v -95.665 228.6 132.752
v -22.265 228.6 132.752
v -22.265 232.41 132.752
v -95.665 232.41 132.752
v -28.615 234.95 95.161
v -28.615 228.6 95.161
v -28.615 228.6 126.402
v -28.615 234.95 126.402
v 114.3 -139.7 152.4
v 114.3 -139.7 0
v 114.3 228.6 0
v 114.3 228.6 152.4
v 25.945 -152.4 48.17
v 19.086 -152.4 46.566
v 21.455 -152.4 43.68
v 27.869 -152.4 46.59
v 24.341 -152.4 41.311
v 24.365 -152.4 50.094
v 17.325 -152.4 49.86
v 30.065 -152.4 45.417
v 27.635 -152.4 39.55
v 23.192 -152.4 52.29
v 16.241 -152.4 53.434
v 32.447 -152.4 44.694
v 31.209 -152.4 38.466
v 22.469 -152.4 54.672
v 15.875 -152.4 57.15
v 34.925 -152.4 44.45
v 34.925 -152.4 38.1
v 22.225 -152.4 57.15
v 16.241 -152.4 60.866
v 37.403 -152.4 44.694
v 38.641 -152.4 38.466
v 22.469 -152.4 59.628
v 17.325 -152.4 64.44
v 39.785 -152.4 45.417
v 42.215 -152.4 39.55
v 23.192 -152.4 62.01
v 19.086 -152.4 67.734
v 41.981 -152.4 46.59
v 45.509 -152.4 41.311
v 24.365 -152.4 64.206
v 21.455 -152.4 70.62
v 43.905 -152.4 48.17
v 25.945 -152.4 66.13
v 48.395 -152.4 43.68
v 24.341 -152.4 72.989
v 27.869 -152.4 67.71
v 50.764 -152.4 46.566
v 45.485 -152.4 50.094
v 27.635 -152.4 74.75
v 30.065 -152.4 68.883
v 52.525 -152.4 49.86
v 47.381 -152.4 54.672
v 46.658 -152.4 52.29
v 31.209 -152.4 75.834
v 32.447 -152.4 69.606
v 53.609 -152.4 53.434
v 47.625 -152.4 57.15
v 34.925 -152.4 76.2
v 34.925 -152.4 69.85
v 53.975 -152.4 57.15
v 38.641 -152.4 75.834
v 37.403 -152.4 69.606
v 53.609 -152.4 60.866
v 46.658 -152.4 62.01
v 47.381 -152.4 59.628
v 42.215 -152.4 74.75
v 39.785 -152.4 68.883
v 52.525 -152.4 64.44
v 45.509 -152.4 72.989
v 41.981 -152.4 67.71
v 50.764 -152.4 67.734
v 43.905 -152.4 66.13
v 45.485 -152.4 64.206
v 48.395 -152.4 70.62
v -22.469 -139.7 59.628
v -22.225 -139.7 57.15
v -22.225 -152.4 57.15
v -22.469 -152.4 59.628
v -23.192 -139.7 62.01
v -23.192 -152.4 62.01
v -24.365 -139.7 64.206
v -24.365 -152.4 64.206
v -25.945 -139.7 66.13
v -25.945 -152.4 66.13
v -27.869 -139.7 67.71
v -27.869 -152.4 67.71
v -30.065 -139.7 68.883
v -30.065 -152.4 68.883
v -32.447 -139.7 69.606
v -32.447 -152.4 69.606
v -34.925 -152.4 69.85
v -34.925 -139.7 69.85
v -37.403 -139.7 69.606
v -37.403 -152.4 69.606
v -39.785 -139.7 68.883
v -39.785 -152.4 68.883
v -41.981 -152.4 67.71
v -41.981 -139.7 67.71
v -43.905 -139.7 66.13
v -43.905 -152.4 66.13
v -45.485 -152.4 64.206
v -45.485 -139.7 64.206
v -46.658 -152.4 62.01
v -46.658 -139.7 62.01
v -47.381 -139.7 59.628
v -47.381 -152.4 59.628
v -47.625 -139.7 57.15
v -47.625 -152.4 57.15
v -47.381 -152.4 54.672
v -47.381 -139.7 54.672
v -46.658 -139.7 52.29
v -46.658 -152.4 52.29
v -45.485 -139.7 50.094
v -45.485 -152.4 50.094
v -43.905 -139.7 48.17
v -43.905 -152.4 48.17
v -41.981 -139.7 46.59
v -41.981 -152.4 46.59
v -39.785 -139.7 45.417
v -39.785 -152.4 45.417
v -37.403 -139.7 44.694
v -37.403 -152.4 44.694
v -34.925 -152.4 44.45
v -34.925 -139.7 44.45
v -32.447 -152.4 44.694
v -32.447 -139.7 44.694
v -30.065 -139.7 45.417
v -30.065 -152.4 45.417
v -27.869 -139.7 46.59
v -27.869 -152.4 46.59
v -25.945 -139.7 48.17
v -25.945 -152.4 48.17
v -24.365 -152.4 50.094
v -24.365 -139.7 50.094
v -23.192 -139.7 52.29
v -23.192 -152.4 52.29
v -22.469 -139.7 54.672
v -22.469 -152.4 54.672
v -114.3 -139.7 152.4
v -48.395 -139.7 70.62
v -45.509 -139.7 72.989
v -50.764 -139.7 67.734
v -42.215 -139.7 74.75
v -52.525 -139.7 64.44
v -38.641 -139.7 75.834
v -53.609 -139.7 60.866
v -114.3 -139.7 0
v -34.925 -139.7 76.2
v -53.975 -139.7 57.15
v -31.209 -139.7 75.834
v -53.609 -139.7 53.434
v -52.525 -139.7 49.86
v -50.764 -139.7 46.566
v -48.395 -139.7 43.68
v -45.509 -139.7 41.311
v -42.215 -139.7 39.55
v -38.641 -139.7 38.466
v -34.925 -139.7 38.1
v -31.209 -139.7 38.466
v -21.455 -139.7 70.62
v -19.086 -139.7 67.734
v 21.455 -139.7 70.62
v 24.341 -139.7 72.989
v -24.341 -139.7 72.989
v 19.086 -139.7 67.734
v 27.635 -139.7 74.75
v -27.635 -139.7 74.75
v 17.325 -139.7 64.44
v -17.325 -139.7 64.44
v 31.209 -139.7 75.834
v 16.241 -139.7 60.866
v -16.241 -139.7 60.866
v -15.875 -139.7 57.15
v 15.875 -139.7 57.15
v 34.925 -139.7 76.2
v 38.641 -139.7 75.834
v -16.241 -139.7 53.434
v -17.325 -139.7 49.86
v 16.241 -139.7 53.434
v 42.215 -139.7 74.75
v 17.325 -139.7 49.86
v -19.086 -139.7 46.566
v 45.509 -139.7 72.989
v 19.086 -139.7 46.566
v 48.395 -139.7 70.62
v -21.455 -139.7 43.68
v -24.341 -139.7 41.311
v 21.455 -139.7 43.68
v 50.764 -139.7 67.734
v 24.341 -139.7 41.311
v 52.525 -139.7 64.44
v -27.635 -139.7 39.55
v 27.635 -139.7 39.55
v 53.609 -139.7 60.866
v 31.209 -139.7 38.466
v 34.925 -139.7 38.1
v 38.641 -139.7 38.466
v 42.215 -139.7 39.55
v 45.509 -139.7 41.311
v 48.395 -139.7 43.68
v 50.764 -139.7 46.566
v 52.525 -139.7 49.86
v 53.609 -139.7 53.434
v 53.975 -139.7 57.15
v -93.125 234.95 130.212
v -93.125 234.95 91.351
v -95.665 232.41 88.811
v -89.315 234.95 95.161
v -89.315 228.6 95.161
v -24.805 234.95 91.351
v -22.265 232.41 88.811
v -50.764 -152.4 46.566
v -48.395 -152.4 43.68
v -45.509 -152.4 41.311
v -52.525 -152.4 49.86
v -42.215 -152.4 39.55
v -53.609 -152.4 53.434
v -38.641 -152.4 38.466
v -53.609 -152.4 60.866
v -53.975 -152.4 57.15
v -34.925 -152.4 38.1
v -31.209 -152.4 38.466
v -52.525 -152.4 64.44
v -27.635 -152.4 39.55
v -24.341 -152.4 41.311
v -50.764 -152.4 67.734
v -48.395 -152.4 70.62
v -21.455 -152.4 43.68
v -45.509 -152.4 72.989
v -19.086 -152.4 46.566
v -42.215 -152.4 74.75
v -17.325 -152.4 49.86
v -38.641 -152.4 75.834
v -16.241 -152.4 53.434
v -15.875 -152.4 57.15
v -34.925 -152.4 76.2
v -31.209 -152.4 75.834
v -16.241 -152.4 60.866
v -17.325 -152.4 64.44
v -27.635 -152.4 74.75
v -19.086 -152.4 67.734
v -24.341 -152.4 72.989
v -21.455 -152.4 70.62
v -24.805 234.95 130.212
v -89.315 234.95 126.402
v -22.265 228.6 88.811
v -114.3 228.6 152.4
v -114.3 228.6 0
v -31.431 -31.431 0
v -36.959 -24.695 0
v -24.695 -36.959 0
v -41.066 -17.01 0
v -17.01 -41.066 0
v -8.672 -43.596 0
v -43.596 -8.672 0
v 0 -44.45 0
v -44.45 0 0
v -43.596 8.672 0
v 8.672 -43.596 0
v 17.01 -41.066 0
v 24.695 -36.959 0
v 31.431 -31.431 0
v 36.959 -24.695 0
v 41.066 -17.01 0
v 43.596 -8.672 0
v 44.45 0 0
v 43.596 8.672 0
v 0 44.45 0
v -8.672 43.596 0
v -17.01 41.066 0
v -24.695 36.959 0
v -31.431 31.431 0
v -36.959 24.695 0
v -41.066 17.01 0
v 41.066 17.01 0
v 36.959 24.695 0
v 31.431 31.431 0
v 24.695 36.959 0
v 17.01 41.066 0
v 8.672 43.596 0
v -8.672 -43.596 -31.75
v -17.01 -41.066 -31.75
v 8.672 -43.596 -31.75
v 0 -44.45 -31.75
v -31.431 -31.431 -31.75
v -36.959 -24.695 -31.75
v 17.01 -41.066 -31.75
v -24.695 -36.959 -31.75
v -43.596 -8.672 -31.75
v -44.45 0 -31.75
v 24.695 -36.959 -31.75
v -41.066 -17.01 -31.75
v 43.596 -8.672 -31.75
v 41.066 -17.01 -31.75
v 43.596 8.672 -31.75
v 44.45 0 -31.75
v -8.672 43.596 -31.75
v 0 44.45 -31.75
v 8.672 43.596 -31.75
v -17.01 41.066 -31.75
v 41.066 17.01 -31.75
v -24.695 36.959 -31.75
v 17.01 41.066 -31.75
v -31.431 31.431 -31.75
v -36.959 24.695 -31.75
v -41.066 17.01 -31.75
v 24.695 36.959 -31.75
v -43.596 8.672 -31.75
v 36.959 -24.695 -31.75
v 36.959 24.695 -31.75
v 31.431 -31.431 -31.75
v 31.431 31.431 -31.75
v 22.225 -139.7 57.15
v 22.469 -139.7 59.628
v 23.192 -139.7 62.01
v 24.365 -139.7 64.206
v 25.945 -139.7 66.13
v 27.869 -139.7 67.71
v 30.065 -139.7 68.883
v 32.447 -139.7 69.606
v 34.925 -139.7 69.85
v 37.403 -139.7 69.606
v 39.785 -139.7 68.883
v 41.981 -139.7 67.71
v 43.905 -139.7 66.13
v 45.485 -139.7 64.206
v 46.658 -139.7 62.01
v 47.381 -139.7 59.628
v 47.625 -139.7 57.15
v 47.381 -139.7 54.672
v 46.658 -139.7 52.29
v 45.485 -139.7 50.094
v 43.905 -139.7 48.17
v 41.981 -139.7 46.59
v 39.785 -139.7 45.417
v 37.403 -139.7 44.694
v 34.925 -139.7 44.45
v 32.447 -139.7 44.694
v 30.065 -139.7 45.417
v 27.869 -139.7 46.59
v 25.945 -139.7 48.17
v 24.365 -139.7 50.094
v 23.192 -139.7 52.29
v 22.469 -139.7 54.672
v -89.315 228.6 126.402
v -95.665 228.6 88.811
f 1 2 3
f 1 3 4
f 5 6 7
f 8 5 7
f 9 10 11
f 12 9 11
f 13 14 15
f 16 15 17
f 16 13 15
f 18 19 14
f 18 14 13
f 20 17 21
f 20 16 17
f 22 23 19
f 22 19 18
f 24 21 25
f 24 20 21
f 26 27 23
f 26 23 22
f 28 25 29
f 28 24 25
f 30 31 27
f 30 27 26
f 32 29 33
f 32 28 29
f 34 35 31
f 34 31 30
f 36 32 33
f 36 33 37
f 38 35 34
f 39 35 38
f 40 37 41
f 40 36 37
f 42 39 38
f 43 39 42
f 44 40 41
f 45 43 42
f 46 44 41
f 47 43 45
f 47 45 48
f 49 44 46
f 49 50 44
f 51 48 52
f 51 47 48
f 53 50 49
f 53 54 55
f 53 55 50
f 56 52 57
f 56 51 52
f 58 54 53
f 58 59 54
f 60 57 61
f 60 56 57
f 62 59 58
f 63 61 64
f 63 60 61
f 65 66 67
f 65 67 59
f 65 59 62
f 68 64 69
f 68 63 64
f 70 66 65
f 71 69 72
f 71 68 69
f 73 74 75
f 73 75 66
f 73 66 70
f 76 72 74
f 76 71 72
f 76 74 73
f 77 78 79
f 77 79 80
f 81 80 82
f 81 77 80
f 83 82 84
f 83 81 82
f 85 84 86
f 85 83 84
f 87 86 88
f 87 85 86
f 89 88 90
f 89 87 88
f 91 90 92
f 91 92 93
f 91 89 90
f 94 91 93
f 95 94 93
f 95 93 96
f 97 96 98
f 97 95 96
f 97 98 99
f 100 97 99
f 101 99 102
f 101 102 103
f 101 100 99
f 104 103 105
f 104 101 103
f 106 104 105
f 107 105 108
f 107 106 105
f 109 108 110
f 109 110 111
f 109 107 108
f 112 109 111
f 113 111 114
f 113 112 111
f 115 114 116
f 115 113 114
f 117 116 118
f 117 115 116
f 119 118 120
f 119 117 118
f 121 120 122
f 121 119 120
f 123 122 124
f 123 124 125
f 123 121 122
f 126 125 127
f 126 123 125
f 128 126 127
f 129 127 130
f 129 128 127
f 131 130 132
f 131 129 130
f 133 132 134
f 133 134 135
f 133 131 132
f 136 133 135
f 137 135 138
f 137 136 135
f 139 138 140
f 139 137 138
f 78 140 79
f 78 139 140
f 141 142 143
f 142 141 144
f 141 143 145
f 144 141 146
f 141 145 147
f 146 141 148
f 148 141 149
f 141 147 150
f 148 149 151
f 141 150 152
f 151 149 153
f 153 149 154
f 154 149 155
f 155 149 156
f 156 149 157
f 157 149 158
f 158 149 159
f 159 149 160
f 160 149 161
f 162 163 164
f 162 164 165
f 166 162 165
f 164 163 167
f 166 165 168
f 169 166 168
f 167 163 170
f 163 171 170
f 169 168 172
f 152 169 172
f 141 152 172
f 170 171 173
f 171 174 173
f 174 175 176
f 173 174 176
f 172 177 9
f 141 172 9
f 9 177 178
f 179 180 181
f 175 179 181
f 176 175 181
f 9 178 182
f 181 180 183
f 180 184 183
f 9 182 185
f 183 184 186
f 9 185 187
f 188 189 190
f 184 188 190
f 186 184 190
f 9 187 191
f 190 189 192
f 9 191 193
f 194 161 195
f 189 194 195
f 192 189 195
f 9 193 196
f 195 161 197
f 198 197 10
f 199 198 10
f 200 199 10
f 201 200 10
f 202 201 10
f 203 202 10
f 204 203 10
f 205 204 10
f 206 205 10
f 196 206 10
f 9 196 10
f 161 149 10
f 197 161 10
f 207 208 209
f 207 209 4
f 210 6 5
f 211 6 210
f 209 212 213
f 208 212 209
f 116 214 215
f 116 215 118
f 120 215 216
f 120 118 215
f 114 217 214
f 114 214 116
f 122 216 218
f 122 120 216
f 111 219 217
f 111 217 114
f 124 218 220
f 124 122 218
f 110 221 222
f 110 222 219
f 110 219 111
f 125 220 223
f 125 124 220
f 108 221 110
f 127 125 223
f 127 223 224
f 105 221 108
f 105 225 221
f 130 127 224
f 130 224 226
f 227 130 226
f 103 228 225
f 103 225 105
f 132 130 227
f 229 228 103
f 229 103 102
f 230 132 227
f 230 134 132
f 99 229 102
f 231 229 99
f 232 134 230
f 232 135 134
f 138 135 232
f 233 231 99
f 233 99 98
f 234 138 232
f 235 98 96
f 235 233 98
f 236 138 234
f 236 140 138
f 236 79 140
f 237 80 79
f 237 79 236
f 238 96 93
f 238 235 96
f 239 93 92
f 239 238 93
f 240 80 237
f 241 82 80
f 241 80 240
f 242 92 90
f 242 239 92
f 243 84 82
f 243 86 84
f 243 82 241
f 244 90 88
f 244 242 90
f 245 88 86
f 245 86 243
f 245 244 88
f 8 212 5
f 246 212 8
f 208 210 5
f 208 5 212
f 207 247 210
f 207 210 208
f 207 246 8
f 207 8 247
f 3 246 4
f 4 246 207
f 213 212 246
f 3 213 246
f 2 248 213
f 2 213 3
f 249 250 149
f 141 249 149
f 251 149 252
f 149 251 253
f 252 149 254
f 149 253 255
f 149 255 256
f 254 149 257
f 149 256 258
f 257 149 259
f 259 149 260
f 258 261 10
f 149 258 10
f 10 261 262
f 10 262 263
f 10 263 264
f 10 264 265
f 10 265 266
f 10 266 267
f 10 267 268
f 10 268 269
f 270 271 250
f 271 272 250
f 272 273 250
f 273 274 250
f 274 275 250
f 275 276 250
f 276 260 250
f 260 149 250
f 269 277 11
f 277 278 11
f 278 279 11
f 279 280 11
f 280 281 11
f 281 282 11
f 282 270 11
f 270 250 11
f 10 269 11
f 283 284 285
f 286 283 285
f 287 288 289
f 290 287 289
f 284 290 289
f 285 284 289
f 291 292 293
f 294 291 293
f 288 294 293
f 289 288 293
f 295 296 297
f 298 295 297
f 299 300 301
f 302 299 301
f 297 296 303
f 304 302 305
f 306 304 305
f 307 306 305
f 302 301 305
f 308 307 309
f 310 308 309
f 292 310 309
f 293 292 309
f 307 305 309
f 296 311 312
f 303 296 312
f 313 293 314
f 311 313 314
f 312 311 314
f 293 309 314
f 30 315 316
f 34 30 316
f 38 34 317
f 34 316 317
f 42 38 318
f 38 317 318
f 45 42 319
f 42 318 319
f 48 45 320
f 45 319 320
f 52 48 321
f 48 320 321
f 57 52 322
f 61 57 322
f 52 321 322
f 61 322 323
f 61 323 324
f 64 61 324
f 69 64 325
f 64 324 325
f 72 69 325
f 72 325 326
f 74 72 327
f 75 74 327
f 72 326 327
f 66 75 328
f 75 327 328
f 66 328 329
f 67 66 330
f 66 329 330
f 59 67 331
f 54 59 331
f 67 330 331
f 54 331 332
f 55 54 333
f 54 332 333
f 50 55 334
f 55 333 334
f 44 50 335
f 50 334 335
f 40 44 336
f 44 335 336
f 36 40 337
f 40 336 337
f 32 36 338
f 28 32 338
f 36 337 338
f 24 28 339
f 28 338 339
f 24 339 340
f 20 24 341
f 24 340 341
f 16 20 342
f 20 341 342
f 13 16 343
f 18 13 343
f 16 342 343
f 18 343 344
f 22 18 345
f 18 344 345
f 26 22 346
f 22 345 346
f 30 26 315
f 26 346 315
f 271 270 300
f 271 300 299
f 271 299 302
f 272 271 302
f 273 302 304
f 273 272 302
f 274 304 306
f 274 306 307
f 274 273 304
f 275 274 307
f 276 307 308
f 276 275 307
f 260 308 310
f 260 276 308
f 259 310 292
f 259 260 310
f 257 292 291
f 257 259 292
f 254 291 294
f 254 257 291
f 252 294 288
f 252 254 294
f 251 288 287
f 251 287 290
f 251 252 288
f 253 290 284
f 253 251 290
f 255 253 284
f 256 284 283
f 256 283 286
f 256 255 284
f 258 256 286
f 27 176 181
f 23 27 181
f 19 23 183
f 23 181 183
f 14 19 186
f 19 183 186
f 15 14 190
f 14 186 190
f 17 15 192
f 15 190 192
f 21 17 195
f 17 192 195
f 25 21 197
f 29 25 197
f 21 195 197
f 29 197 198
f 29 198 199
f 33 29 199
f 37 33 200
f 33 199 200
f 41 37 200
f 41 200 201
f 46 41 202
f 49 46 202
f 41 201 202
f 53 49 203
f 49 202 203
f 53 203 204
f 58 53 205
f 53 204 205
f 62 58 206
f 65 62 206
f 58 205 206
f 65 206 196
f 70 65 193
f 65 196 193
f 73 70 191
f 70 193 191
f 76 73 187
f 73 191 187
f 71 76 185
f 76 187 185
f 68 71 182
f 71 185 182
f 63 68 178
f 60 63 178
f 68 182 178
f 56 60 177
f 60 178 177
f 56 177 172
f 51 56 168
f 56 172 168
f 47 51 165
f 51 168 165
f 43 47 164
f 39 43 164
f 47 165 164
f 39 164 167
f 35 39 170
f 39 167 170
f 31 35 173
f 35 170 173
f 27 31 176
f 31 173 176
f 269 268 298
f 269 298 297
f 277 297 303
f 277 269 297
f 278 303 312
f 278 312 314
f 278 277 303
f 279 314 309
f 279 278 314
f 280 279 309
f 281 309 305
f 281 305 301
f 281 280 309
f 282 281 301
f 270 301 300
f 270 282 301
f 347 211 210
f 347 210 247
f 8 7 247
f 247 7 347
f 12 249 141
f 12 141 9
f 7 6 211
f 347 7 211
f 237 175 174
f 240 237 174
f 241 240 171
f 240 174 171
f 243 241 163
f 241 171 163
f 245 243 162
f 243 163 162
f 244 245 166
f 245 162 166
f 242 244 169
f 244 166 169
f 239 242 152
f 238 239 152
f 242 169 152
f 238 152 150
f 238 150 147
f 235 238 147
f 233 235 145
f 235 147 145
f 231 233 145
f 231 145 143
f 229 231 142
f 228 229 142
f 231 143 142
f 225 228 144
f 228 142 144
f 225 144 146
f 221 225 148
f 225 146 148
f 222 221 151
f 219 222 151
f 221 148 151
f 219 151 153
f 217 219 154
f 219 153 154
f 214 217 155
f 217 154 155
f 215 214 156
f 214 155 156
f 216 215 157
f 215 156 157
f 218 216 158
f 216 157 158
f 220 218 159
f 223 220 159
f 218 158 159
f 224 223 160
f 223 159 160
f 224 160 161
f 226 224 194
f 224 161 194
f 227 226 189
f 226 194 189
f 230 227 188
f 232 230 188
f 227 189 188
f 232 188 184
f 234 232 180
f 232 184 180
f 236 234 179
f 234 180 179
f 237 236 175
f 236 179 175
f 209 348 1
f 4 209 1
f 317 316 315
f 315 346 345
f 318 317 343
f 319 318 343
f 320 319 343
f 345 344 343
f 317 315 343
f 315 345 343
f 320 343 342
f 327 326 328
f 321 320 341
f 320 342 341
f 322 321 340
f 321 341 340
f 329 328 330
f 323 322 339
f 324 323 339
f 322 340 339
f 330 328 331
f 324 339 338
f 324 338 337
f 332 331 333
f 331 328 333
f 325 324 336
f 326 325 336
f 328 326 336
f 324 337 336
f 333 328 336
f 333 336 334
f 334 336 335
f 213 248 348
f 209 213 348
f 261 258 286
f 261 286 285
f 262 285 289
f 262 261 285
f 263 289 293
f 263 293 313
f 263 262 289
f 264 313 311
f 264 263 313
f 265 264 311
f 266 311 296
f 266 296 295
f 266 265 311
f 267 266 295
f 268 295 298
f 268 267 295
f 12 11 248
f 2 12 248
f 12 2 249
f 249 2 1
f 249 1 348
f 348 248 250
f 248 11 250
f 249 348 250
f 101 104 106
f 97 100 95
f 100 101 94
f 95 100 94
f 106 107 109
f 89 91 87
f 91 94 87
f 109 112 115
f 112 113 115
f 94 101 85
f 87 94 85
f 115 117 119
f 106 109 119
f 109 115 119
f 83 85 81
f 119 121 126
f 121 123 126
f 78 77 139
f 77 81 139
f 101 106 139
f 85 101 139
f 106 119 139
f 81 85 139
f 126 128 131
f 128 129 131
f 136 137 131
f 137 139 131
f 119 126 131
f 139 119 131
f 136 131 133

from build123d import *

# Parameters (mm, degrees)
F1_DEPTH = 152.4
F2_DEPTH = 31.75
F3_W     = 73.3992542744
F3_H     = 43.9409847975
F3_W_2   = 60.6992542744
F3_H_2   = 31.2409847975
F4_DEPTH = 6.35
F5_SIZE  = 2.54
F6_R     = 19.05
F6_R_2   = 12.7
F7_DEPTH = 12.7


# Not quite as in the source:
# - a feature names something its author has since deleted; it is built from what else it names


with BuildPart() as f1:
    # F0 (on Top) → F1 (new body)
    with BuildSketch(Plane.XY):
        with BuildLine():
            Line((0, 228.6), (0, 44.45))
            ThreePointArc((0, 44.45), (31.4308964237, 31.4308964237), (44.45, 0))
            ThreePointArc((44.45, 0), (31.4308964237, -31.4308964237), (0, -44.45))
            Line((0, -44.45), (0, -139.7))
            Line((0, -139.7), (114.3, -139.7))
            Line((114.3, -139.7), (114.3, 228.6))
            Line((114.3, 228.6), (0, 228.6))
        make_face()
        with BuildLine():
            ThreePointArc((0, -44.45), (-44.45, 0), (0, 44.45))
            Line((0, 44.45), (0, 228.6))
            Line((0, 228.6), (-114.3, 228.6))
            Line((-114.3, 228.6), (-114.3, -139.7))
            Line((-114.3, -139.7), (0, -139.7))
            Line((0, -139.7), (0, -44.45))
        make_face()
        with BuildLine():
            Line((0, 44.45), (0, 0))
            Line((0, 0), (0, -44.45))
            ThreePointArc((0, -44.45), (31.4308964237, -31.4308964237), (44.45, 0))
            ThreePointArc((44.45, 0), (31.4308964237, 31.4308964237), (0, 44.45))
        make_face()
        with BuildLine():
            Line((0, -44.45), (0, 0))
            Line((0, 0), (0, 44.45))
            ThreePointArc((0, 44.45), (-44.45, 0), (0, -44.45))
        make_face()
    extrude(amount=F1_DEPTH)

    # F0 (on Top) → F2 (join)
    with BuildSketch(Plane.XY):
        with BuildLine():
            Line((0, 44.45), (0, 0))
            Line((0, 0), (0, -44.45))
            ThreePointArc((0, -44.45), (31.4308964237, -31.4308964237), (44.45, 0))
            ThreePointArc((44.45, 0), (31.4308964237, 31.4308964237), (0, 44.45))
        make_face()
        with BuildLine():
            Line((0, -44.45), (0, 0))
            Line((0, 0), (0, 44.45))
            ThreePointArc((0, 44.45), (-44.45, 0), (0, -44.45))
        make_face()
    extrude(amount=-F2_DEPTH)

    # F3 (on face) → F4 (join)
    with BuildSketch(Plane(origin=(0, 228.6, 0), x_dir=(-1, 0, 0), z_dir=(0, 1, 0))):
        with Locations((58.9650124311, 110.7811406255)):
            Rectangle(F3_W, F3_H)
        with Locations((58.9650124311, 110.7811406255)):
            Rectangle(F3_W_2, F3_H_2, mode=Mode.SUBTRACT)
    extrude(amount=F4_DEPTH)

    # F5
    f5_edges = [f1.edges().sort_by_distance(p)[0] for p in [
        (-95.66464, 234.95, 110.781141),
        (-58.965012, 234.95, 88.810648),
        (-22.265385, 234.95, 110.781141),
        (-58.965012, 234.95, 132.751633),
    ]]
    chamfer(f5_edges, length=F5_SIZE)

    # F6 (on face) → F7 (join)
    with BuildSketch(Plane.XZ.offset(139.7)):
        with BuildLine():
            ThreePointArc((53.975, 57.15), (34.925, 76.2), (15.875, 57.15))
            ThreePointArc((15.875, 57.15), (34.925, 38.1), (53.975, 57.15))
        make_face()
        with BuildLine():
            ThreePointArc((47.625, 57.15), (34.925, 44.45), (22.225, 57.15))
            ThreePointArc((22.225, 57.15), (34.925, 69.85), (47.625, 57.15))
        make_face(mode=Mode.SUBTRACT)
        with Locations((-34.925, 57.15)):
            Circle(F6_R)
        with Locations((-34.925, 57.15)):
            Circle(F6_R_2, mode=Mode.SUBTRACT)
    extrude(amount=F7_DEPTH)


solid = f1.part
